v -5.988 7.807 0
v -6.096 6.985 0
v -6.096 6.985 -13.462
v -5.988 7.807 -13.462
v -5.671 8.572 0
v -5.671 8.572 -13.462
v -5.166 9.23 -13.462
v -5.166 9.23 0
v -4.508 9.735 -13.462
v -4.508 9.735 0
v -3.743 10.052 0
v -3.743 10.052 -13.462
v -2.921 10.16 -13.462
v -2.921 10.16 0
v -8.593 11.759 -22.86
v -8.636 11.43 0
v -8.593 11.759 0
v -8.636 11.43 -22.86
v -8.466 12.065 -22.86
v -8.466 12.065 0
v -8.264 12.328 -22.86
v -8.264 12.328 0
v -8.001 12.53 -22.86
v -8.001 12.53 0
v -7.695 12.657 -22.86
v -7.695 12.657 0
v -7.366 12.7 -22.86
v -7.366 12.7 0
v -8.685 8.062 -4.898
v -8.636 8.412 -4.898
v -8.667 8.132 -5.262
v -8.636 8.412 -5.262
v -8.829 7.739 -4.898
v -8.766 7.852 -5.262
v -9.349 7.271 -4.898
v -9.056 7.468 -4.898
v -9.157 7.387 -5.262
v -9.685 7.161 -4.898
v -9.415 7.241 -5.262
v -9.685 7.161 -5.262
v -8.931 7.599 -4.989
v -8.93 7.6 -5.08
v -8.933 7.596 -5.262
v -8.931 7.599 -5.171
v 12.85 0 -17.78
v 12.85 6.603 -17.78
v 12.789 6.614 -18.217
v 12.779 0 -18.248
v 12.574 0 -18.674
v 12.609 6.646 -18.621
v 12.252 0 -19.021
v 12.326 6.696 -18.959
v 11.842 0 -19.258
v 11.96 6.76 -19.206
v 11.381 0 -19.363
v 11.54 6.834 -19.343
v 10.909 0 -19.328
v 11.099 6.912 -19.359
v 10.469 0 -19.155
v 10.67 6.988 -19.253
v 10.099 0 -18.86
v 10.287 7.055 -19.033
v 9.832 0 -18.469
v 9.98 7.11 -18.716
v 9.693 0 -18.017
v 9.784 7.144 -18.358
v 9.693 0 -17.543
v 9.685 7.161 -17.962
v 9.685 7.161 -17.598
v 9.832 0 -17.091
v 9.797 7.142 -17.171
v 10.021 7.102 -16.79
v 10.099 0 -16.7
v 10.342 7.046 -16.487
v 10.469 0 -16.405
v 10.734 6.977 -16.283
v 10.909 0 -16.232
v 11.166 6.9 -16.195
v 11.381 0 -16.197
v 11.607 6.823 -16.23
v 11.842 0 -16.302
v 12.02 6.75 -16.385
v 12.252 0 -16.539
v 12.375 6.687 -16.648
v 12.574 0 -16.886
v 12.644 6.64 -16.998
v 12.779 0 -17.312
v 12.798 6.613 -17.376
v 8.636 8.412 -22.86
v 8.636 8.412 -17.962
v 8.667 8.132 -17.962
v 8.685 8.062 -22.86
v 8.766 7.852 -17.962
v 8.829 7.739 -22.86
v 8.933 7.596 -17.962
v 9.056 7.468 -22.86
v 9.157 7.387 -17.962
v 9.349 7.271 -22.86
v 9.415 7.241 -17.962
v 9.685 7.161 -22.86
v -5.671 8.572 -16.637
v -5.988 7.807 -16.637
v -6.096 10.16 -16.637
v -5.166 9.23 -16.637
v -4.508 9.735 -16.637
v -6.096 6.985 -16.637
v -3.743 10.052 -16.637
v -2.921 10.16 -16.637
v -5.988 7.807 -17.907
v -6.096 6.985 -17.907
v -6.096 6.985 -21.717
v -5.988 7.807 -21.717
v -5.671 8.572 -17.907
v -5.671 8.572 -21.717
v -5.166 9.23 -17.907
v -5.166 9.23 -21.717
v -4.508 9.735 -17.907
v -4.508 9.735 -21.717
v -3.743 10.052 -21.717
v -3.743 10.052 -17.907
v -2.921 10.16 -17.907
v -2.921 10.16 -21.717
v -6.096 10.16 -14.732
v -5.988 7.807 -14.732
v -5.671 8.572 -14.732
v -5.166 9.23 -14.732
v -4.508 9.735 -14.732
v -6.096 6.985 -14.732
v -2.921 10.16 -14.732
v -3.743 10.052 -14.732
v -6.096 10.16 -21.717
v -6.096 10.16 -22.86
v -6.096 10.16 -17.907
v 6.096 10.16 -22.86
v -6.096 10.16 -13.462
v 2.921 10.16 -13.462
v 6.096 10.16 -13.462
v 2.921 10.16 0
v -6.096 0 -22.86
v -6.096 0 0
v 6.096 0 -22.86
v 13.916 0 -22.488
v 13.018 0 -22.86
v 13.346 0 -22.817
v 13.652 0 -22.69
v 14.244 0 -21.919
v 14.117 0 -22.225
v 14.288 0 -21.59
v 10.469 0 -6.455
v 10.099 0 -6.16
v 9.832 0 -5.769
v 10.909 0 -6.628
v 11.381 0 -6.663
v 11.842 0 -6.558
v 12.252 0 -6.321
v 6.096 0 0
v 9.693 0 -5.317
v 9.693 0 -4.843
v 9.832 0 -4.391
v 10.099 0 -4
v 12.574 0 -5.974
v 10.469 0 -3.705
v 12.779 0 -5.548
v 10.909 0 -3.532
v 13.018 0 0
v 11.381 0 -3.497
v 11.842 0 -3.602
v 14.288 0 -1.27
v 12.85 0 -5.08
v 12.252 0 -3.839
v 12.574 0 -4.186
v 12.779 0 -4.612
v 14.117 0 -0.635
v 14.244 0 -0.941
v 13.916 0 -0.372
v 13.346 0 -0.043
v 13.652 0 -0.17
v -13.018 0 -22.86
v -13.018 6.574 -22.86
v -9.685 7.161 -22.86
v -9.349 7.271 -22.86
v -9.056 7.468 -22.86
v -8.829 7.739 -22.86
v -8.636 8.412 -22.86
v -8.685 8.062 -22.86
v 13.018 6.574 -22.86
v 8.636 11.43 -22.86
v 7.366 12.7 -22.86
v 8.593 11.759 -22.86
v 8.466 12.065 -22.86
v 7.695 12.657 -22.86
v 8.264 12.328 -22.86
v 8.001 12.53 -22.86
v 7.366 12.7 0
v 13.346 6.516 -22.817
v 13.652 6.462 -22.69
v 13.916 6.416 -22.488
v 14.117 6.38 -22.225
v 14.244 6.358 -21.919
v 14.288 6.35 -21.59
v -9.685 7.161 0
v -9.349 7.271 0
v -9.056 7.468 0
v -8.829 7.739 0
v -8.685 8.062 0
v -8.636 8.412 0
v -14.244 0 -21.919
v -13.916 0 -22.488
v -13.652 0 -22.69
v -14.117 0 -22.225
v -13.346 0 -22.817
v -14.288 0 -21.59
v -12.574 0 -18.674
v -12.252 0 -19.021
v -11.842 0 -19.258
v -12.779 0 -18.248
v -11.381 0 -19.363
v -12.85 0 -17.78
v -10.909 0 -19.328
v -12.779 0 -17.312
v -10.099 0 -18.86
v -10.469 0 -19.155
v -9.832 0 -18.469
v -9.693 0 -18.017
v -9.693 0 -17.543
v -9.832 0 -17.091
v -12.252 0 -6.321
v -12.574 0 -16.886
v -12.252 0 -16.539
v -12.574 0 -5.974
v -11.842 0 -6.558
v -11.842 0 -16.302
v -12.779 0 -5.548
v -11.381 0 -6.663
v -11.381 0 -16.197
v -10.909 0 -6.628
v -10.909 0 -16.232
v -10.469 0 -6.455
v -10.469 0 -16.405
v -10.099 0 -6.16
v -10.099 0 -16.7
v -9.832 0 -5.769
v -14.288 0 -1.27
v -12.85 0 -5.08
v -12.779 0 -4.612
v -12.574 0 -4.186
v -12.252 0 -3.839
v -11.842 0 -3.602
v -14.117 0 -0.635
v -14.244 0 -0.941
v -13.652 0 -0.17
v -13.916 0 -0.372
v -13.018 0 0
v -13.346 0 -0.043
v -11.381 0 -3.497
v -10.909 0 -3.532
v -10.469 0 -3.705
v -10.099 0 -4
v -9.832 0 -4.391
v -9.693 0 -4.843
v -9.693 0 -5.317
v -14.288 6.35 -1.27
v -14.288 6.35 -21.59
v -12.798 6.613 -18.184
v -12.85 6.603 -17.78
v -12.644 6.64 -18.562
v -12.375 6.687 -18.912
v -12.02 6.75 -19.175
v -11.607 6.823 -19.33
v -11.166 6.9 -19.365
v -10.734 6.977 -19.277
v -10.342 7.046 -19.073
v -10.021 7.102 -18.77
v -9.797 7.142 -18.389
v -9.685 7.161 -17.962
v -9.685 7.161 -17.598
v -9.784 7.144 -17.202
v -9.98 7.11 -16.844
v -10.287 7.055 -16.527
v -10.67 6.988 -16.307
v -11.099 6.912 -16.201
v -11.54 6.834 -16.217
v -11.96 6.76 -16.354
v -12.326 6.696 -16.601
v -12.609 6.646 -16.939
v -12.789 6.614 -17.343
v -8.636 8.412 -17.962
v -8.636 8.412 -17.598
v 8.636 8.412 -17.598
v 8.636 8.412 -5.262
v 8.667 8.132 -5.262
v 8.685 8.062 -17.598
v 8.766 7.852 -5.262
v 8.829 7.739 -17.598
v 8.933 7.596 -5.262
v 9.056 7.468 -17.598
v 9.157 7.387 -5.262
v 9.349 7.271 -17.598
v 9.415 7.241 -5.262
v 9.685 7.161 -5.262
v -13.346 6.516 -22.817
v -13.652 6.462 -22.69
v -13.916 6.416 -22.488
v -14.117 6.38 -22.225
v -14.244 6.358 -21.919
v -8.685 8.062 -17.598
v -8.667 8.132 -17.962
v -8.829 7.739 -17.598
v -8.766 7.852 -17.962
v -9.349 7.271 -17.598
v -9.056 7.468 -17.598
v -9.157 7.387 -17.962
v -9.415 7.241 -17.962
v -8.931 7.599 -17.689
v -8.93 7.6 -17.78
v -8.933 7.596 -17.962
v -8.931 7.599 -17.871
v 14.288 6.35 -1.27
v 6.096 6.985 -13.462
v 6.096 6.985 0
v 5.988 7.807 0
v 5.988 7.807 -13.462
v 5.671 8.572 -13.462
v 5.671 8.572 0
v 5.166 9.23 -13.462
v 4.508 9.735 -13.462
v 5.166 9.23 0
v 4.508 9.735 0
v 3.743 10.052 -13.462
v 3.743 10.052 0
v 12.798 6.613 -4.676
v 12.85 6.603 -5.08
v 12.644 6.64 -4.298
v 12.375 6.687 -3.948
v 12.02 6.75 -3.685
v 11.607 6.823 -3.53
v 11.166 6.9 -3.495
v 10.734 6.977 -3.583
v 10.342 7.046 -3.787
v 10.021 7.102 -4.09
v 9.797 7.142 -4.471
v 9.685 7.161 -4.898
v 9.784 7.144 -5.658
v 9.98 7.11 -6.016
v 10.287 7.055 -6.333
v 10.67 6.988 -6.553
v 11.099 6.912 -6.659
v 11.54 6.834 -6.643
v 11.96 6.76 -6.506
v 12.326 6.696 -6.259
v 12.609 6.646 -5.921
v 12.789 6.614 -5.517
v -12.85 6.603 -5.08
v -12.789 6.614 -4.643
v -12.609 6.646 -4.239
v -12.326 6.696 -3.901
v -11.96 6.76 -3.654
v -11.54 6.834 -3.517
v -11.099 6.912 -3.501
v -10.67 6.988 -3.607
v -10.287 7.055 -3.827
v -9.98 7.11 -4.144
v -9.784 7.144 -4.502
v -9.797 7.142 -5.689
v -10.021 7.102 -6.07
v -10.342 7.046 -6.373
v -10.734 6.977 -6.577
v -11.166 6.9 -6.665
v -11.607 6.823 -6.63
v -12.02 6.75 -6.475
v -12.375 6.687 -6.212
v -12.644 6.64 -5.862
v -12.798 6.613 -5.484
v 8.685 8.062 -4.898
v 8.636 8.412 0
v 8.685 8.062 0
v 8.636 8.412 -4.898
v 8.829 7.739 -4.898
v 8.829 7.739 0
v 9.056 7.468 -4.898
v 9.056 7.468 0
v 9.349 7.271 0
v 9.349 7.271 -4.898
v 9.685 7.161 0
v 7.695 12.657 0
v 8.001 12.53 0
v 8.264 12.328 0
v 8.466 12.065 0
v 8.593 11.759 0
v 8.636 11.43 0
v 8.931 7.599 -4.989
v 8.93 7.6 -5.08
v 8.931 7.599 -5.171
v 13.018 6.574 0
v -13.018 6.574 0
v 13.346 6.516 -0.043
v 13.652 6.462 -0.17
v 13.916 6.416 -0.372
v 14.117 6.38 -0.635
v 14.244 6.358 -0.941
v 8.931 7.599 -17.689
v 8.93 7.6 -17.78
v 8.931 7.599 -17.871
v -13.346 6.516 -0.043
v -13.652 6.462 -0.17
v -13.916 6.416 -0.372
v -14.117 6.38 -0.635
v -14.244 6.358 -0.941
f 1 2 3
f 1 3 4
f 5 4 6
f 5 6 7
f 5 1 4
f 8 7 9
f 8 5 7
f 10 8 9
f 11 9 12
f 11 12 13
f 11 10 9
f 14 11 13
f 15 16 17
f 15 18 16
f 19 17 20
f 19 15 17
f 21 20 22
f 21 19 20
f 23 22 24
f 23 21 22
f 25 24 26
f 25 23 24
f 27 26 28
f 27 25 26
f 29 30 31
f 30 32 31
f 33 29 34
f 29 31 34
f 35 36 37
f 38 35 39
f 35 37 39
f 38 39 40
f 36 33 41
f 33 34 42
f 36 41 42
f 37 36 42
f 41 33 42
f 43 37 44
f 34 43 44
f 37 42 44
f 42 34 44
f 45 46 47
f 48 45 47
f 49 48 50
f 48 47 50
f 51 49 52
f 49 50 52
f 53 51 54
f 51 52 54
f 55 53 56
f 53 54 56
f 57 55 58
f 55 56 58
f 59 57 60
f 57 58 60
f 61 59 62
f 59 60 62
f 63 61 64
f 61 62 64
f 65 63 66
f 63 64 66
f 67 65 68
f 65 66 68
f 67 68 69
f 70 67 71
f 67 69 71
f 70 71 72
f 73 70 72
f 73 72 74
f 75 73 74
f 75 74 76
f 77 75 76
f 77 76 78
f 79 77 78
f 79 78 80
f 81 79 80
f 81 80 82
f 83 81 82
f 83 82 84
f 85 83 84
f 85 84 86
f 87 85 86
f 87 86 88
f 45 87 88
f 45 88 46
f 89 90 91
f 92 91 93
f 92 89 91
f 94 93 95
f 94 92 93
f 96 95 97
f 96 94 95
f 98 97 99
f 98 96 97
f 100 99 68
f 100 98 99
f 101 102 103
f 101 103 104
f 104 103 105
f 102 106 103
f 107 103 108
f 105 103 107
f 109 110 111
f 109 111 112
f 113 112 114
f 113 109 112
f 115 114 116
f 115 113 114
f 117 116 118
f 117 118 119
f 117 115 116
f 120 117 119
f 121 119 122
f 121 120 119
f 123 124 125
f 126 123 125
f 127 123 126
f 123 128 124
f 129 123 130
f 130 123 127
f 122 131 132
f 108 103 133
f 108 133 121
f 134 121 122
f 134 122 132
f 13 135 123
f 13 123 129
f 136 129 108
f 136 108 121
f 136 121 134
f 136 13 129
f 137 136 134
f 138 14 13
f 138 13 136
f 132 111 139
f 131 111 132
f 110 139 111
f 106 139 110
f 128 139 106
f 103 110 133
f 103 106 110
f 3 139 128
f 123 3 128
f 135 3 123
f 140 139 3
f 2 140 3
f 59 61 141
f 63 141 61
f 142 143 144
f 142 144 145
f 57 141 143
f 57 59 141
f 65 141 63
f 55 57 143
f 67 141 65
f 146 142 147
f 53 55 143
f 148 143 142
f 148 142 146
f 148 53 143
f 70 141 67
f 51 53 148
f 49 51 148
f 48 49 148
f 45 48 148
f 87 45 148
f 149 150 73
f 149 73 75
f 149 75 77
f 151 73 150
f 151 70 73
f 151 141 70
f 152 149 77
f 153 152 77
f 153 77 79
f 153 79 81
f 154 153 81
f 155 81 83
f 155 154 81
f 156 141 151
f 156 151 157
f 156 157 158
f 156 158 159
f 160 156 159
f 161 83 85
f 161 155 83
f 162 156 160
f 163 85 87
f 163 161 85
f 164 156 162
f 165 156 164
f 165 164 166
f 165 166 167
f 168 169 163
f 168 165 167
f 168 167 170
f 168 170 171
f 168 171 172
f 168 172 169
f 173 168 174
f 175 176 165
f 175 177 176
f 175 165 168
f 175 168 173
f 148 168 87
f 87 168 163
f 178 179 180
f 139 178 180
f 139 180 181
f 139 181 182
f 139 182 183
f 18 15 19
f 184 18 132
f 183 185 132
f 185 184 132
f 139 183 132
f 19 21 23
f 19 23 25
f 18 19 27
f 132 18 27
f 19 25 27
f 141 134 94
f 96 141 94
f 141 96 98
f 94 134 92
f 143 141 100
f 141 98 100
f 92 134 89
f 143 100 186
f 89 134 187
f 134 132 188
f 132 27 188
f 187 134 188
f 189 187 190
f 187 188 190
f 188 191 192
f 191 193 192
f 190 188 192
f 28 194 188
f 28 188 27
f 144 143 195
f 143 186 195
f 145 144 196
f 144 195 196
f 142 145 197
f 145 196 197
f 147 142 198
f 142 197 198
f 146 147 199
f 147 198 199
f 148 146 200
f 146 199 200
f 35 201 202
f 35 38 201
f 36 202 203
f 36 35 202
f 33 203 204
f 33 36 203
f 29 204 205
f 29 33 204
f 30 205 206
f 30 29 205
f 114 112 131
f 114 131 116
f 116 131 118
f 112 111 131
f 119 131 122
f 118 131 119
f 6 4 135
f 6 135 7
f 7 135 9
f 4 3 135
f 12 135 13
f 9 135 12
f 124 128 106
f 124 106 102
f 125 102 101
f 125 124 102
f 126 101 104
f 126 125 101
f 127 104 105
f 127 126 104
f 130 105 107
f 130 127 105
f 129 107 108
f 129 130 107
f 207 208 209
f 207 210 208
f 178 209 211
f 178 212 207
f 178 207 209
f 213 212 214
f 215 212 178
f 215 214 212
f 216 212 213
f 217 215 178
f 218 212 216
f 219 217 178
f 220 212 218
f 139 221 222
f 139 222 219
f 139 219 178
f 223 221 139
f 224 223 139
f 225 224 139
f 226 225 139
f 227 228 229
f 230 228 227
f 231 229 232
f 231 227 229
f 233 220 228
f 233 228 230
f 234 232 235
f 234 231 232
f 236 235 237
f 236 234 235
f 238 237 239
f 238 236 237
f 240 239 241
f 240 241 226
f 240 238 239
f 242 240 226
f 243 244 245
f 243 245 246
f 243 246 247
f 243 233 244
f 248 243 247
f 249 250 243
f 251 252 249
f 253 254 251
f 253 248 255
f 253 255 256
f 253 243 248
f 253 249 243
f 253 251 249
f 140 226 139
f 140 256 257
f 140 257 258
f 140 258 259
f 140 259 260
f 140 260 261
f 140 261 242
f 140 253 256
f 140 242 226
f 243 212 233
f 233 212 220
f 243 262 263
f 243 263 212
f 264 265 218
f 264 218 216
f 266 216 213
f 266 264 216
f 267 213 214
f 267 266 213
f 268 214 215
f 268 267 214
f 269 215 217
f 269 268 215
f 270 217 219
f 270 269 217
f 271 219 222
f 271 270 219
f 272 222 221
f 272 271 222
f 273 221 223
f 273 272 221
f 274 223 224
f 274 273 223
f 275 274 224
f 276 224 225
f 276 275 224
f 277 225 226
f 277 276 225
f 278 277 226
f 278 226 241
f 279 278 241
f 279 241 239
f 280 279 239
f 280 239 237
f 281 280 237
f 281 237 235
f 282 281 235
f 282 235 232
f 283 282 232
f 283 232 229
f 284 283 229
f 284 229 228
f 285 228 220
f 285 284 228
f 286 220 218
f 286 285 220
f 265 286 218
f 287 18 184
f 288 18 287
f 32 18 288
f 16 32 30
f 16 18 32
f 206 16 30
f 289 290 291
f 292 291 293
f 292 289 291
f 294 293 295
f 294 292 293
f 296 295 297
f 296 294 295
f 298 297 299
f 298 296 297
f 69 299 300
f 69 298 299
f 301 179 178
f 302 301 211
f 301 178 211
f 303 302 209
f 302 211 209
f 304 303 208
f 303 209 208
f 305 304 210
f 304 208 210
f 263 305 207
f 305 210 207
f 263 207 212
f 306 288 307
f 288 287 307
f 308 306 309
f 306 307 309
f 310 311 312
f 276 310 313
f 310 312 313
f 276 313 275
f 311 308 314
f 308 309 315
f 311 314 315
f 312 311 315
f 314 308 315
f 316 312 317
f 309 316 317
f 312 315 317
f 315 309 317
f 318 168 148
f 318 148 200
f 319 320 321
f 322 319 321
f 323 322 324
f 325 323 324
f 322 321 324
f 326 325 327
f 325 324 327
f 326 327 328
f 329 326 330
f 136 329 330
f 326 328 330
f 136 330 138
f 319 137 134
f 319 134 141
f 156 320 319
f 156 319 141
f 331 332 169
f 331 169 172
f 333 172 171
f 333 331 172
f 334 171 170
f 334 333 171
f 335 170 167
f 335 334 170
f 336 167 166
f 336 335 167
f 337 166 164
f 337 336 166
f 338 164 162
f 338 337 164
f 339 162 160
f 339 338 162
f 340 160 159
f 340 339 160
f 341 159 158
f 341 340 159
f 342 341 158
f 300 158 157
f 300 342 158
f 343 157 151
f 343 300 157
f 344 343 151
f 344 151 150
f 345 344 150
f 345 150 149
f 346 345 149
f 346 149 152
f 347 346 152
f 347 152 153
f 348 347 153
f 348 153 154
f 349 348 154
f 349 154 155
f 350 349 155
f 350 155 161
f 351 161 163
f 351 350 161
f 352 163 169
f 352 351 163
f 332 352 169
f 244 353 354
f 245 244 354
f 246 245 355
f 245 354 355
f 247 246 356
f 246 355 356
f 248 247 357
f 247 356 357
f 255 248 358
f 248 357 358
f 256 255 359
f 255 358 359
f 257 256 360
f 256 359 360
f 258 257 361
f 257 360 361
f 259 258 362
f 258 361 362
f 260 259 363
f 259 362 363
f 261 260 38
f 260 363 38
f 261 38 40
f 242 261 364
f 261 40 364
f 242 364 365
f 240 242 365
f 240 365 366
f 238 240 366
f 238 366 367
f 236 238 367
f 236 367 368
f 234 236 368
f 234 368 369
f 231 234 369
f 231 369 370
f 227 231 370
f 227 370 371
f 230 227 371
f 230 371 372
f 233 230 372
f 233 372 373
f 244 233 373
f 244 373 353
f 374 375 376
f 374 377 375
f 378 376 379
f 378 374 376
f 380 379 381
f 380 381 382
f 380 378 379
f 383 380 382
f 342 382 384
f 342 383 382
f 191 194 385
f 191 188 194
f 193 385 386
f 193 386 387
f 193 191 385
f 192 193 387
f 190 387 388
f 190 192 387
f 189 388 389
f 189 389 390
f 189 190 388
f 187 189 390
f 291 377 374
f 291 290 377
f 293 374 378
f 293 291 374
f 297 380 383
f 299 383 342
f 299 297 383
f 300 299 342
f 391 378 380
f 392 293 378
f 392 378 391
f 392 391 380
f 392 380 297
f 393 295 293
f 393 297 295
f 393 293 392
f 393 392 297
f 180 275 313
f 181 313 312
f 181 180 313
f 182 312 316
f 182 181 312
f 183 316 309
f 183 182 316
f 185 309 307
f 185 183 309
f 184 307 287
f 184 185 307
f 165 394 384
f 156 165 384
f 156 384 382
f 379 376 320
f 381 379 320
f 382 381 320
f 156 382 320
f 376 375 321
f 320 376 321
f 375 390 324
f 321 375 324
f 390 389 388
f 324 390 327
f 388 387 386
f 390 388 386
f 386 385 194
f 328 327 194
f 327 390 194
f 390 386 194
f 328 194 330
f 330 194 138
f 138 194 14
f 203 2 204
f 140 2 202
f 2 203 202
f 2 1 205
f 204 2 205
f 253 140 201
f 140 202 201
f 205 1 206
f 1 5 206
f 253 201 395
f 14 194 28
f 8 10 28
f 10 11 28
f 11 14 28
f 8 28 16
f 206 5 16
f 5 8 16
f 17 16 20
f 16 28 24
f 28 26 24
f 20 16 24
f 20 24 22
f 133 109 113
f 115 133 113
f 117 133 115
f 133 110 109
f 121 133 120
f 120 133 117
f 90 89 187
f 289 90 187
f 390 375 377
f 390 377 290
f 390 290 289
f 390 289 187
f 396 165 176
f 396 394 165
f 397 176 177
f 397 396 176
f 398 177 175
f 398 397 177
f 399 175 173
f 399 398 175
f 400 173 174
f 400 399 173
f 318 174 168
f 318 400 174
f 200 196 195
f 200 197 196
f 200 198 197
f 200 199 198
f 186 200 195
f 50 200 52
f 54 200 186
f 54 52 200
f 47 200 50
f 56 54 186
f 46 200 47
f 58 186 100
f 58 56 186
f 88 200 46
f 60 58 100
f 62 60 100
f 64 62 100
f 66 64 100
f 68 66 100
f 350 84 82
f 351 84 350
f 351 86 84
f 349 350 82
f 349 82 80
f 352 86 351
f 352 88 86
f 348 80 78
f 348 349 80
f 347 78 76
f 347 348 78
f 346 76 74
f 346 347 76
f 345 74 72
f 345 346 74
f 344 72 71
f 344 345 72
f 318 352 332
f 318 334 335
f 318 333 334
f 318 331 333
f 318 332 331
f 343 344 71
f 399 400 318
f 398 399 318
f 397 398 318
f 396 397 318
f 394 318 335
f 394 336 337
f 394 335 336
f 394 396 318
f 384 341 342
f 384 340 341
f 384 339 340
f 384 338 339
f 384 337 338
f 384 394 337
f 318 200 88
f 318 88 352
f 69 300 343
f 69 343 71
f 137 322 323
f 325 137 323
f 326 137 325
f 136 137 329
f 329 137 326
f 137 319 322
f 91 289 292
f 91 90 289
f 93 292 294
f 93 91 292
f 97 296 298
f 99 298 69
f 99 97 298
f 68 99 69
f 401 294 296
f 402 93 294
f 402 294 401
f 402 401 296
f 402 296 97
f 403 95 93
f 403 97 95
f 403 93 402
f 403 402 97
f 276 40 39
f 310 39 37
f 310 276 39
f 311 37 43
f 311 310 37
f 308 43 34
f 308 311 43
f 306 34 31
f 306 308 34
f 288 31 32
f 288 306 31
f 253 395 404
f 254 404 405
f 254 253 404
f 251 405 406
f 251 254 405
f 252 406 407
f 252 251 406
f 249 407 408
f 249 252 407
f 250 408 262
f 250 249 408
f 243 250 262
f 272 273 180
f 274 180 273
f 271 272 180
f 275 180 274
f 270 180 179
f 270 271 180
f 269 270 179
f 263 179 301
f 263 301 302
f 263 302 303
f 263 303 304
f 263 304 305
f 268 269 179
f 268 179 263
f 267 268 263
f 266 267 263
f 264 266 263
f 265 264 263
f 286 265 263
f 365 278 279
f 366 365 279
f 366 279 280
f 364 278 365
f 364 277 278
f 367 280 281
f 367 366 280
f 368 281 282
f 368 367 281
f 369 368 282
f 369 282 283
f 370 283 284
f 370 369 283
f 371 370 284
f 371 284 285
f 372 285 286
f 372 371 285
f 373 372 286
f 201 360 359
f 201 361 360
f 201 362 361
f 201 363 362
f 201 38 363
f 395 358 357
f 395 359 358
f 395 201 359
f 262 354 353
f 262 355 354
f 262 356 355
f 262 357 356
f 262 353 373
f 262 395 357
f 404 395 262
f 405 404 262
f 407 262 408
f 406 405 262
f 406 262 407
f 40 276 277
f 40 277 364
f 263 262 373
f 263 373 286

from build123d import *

# Parameters (mm, degrees)
BOSS_EXTRUDE1_DEPTH = 22.86
BOSS_EXTRUDE2_DEPTH = 13.462
BOSS_EXTRUDE3_START = -1.27
BOSS_EXTRUDE3_DEPTH = 1.905
BOSS_EXTRUDE4_START = -1.27
BOSS_EXTRUDE4_DEPTH = 3.81
FILLET1_R           = 1.27


with BuildPart() as part:
    # Sketch1 → Boss-Extrude1 (new body)
    with BuildSketch(Plane.XY):
        Polygon((-6.096, 10.16), (6.096, 10.16), (6.096, 0), (14.2875, 0), (14.2875, 6.35), (8.636, 7.346511931), (8.636, 12.7), (-8.636, 12.7), (-8.636, 7.346511931), (-14.2875, 6.35), (-14.2875, 0), (-6.096, 0), align=None)
    extrude(amount=-BOSS_EXTRUDE1_DEPTH)

    # Sketch2 → Boss-Extrude2 (add)
    with BuildSketch(Plane.XY):
        with BuildLine():
            Line((2.921, 10.16), (6.096, 10.16))
            Line((6.096, 10.16), (6.096, 6.985))
            ThreePointArc((6.096, 6.985), (5.16606403, 9.23006403), (2.921, 10.16))
        make_face()
        with BuildLine():
            Line((-6.096, 10.16), (-6.096, 6.985))
            ThreePointArc((-6.096, 6.985), (-5.16606403, 9.23006403), (-2.921, 10.16))
            Line((-2.921, 10.16), (-6.096, 10.16))
        make_face()
    extrude(amount=-BOSS_EXTRUDE2_DEPTH)

    # Sketch3 → Boss-Extrude3 (add)
    with BuildSketch(Plane.XY.offset(-13.462).offset(BOSS_EXTRUDE3_START)):
        with BuildLine():
            Line((-6.096, 10.16), (-6.096, 6.985))
            ThreePointArc((-6.096, 6.985), (-5.16606403, 9.23006403), (-2.921, 10.16))
            Line((-2.921, 10.16), (-6.096, 10.16))
        make_face()
    extrude(amount=-BOSS_EXTRUDE3_DEPTH)

    # Sketch4 → Boss-Extrude4 (add)
    with BuildSketch(Plane.XY.offset(-16.637).offset(BOSS_EXTRUDE4_START)):
        with BuildLine():
            Line((-6.096, 10.16), (-6.096, 6.985))
            ThreePointArc((-6.096, 6.985), (-5.16606403, 9.23006403), (-2.921, 10.16))
            Line((-2.921, 10.16), (-6.096, 10.16))
        make_face()
    extrude(amount=-BOSS_EXTRUDE4_DEPTH)

    # Sketch6 → Cut-Revolve1 (revolve, cut)
    with BuildSketch(Plane.XY.offset(-5.08)):
        Polygon((11.262482277, -1.27), (12.849982277, -1.27), (12.849982277, 6.60347316), (12.849982277, 9.423392242), (11.262482277, 9.423392242), (11.262482277, 6.883392242), align=None)
    cut_revolve1 = revolve(axis=Axis((11.262482277, -1.27, -5.08), (0, -1, 0)), mode=Mode.SUBTRACT)

    # Mirror1: Cut-Revolve1 across plane
    add(cut_revolve1.mirror(Plane(origin=(0, 0, 0), x_dir=(0, 0, 1), z_dir=(1, 0, 0))), mode=Mode.SUBTRACT)

    # Mirror2: Cut-Revolve1 across plane
    add(cut_revolve1.mirror(Plane.XY.offset(-11.43)), mode=Mode.SUBTRACT)

    # Mirror2 copy 1 sketch → Mirror2 copy 1 (revolve, cut)
    with BuildSketch(Plane(origin=(0, 0, -17.78), x_dir=(-1, 0, 0), z_dir=(0, 0, -1))):
        Polygon((11.262482277, -1.27), (12.849982277, -1.27), (12.849982277, 6.60347316), (12.849982277, 9.423392242), (11.262482277, 9.423392242), (11.262482277, 6.883392242), align=None)
    revolve(axis=Axis((-11.262482277, -1.27, -17.78), (0, -1, 0)), mode=Mode.SUBTRACT)

    # Fillet1
    fillet1_edges = [part.edges().sort_by_distance(p)[0] for p in [
        (-14.2875, 3.175, 0),
        (14.2875, 3.175, 0),
        (14.2875, 3.175, -22.86),
        (-8.636, 7.346511931, -11.43),
        (-8.636, 12.7, -11.43),
        (8.636, 12.7, -11.43),
        (8.636, 7.346511931, -11.43),
        (-14.2875, 3.175, -22.86),
    ]]
    fillet(fillet1_edges, radius=FILLET1_R)


solid = part.part
